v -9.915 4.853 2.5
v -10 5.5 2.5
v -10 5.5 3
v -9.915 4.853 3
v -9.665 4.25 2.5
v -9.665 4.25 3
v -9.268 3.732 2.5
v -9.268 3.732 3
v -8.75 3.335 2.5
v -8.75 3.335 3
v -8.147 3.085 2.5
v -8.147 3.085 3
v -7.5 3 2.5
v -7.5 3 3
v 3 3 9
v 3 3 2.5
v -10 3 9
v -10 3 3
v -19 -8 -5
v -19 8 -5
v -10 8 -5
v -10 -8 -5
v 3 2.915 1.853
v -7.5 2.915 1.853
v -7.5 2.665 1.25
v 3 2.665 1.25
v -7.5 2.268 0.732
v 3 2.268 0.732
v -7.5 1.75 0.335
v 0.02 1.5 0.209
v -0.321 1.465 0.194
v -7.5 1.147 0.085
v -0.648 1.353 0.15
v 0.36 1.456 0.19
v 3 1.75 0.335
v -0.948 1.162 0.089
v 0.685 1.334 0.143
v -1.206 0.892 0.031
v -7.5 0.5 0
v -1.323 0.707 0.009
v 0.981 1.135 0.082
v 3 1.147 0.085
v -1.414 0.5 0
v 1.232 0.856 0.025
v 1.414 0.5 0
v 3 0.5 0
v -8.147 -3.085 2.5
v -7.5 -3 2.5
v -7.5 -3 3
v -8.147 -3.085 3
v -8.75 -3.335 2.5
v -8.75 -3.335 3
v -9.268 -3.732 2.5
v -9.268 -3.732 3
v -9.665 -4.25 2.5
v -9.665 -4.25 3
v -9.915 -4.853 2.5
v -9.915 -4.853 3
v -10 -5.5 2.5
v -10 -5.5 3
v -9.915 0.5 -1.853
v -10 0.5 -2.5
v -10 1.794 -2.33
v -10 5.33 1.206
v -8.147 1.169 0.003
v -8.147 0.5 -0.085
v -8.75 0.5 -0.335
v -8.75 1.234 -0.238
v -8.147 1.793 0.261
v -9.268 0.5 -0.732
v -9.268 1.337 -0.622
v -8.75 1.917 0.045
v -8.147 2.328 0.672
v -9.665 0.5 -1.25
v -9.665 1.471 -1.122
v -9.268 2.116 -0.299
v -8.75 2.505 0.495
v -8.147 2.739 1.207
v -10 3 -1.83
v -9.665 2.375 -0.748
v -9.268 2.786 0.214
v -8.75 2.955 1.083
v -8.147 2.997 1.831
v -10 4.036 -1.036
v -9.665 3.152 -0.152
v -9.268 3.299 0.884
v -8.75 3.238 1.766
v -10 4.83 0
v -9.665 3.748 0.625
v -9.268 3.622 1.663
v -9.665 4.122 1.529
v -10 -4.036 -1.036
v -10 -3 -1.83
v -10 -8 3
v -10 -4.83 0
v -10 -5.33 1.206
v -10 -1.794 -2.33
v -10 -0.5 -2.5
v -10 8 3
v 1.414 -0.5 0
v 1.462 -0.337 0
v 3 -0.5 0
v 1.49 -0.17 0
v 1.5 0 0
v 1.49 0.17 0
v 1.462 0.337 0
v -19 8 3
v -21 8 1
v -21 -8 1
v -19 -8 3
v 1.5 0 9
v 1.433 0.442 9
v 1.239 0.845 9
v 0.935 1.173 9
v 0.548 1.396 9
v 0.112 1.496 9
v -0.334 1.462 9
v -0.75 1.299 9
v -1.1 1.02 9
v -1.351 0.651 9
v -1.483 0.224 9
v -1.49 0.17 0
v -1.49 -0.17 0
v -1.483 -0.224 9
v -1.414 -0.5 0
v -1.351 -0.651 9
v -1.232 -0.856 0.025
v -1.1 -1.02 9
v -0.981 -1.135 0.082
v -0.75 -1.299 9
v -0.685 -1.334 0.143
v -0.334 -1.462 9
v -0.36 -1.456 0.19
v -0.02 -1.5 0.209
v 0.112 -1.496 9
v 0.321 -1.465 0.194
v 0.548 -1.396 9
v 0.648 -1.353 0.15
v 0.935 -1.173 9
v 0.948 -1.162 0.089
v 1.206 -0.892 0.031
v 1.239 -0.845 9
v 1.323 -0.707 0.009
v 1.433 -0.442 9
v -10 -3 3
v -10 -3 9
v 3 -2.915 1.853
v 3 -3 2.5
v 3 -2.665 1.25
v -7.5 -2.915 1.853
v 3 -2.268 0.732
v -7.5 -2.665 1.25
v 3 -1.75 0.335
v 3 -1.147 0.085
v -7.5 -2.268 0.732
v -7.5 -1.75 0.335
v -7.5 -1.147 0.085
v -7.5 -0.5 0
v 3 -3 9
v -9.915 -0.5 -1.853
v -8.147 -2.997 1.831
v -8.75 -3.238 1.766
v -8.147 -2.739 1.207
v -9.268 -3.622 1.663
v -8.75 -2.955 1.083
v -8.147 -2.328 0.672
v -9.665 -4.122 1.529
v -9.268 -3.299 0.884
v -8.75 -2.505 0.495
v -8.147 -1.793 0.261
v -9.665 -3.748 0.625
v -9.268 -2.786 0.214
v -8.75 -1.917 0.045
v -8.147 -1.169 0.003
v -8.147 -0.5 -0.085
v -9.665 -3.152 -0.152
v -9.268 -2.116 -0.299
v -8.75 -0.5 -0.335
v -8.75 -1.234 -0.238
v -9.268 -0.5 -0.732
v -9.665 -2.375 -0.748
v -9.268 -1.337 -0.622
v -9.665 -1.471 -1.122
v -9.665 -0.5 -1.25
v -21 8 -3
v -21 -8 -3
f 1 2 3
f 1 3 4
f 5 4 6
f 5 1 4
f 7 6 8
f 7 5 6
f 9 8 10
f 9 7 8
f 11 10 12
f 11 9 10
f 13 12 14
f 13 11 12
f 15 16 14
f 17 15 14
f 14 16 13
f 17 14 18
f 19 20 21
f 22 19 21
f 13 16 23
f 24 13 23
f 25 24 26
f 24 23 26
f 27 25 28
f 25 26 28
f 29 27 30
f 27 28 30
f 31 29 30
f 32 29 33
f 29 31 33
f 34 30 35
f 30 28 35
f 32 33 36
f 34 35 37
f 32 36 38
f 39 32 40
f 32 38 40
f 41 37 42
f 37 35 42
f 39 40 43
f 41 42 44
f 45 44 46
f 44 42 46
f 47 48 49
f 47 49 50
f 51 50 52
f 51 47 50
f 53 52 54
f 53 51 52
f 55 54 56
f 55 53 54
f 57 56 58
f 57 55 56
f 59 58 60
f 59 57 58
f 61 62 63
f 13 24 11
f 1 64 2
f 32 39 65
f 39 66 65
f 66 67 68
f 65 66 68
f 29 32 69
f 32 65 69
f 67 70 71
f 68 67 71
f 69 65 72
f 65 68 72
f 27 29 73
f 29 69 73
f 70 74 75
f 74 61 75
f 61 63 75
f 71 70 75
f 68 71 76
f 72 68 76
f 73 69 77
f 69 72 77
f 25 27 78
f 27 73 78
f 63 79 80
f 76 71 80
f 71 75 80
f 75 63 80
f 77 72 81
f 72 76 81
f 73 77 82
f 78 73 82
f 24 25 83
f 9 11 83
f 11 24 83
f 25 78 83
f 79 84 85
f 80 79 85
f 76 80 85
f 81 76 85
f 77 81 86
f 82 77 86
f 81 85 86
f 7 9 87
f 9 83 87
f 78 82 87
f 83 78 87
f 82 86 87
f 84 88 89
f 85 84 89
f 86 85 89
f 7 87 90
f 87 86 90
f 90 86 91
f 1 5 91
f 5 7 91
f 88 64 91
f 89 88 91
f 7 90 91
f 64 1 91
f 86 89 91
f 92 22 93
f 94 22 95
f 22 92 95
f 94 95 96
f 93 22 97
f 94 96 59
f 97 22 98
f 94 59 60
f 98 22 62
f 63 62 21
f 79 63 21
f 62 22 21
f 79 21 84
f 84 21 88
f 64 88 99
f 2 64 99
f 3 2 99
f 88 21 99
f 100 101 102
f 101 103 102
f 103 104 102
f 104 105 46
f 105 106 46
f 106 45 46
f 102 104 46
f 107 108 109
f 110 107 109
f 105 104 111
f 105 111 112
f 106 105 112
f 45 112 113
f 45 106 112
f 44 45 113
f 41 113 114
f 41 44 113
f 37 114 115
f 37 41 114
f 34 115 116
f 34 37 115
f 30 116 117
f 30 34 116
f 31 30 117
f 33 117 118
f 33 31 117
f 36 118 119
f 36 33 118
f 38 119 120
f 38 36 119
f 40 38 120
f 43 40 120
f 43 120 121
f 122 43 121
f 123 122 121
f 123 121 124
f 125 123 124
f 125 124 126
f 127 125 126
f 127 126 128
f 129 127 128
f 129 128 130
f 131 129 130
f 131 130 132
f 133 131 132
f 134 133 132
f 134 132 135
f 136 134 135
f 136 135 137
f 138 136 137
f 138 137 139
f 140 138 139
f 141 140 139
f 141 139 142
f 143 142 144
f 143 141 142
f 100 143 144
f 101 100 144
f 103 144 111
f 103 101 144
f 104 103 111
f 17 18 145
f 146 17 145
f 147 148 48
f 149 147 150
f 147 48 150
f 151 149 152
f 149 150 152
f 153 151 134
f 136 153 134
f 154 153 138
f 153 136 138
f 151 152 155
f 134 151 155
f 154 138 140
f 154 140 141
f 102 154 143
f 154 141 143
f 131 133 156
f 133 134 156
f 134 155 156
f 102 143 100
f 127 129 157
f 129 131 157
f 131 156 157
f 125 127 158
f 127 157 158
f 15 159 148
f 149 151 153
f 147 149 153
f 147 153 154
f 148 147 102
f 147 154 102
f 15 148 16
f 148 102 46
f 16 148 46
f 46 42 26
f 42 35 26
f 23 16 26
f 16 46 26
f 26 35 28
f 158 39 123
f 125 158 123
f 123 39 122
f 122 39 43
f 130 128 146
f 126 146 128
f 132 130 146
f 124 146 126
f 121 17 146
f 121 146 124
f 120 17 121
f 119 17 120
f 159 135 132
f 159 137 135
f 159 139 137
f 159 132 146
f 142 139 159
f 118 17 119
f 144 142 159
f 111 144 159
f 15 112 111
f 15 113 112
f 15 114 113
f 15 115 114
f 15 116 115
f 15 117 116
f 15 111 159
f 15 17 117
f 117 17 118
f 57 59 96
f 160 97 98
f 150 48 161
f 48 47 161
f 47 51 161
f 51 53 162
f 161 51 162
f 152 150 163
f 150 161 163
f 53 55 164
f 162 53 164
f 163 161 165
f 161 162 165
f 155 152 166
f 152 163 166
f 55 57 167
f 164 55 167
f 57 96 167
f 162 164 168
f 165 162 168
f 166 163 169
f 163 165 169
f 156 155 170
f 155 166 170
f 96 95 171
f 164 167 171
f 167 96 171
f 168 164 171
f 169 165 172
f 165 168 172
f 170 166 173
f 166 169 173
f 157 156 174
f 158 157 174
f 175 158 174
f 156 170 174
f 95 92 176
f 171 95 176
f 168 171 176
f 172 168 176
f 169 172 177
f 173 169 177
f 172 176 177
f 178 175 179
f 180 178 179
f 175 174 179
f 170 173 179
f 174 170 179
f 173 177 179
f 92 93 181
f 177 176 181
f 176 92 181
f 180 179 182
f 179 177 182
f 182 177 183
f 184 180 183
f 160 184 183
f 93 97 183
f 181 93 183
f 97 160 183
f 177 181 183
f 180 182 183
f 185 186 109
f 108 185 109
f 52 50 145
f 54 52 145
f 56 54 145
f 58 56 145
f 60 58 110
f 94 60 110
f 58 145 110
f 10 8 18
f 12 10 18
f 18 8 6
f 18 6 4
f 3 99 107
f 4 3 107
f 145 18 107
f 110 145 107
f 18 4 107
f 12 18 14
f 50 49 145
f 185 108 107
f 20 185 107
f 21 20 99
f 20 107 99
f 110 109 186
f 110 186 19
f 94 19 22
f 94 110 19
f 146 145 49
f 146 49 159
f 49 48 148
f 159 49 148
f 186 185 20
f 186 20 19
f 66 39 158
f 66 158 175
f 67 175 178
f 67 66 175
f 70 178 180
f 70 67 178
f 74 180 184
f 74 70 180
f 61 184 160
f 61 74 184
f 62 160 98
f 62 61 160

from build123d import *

# Parameters (mm, degrees)
ESBO_O1_R                     = 1.5
RESSALTO_EXTRUS_O1_DEPTH      = 9
RESSALTO_EXTRUS_O2_DEPTH      = 5
RESSALTO_EXTRUS_O2_DEPTH_BACK = 11
ESBO_O2_W                     = 11
ESBO_O2_H                     = 8
FILETE1_R                     = 2.5
CHANFRO1_SIZE                 = 2


with BuildPart() as part:
    # Esboço1 → Ressalto-extrusão1 (new body)
    with BuildSketch(Plane.XY):
        Polygon((-3, -3), (3, -3), (3, 3), (-3, 3), (-10, 3), (-10, -3), align=None)
        Circle(ESBO_O1_R, mode=Mode.SUBTRACT)
    extrude(amount=RESSALTO_EXTRUS_O1_DEPTH)

    # Esboço2 → Ressalto-extrusão2 (add, two sides: drawn at the far end of the back side and taken through both)
    with BuildSketch(Plane.XZ.offset(3).offset(-RESSALTO_EXTRUS_O2_DEPTH_BACK)):
        with Locations((-15.5, -1)):
            Rectangle(ESBO_O2_W, ESBO_O2_H)
    extrude(amount=RESSALTO_EXTRUS_O2_DEPTH + RESSALTO_EXTRUS_O2_DEPTH_BACK)

    # Filete1
    # the kernel refuses this fillet: 2.5 mm, written as the material it takes off along each edge
    with BuildSketch(Plane(origin=(-10, -3, 0), x_dir=(0, 0, 1), z_dir=(1, 0, 0))) as filete1_piece_1:
        with BuildLine():
            CenterArc((FILETE1_R, -FILETE1_R), FILETE1_R, 90, 90)
            Line((0, -FILETE1_R), (0, 0))
            Line((0, 0), (FILETE1_R, 0))
        make_face()
    extrude(amount=19.25, mode=Mode.SUBTRACT)
    with BuildSketch(Plane(origin=(9.25, 3, 0), x_dir=(0, -1, 0), z_dir=(-1, 0, 0))) as filete1_piece_2:
        with BuildLine():
            CenterArc((FILETE1_R, FILETE1_R), FILETE1_R, 180, 90)
            Line((0, FILETE1_R), (0, 0))
            Line((0, 0), (FILETE1_R, 0))
        make_face()
    extrude(amount=19.25, mode=Mode.SUBTRACT)
    # the kernel refuses this fillet: 2.5 mm, written as the material it adds along each edge
    with BuildSketch(Plane(origin=(-10, -3, 2.5), x_dir=(1, 0, 0), z_dir=(0, 0, 1)), Plane(origin=(-10, 3, 2.5), x_dir=(0, 1, 0), z_dir=(0, 0, 1))) as filete1_2_piece_1:
        with BuildLine():
            CenterArc((FILETE1_R, -FILETE1_R), FILETE1_R, 90, 90)
            Line((0, -FILETE1_R), (0, 0))
            Line((0, 0), (FILETE1_R, 0))
        make_face()
    extrude(amount=0.5)
    with BuildSketch(Plane(origin=(-10, 0.5, 0), x_dir=(0, 0, -1), z_dir=(0, -1, 0))) as filete1_2_piece_2:
        with BuildLine():
            CenterArc((FILETE1_R, FILETE1_R), FILETE1_R, 180, 90)
            Line((0, FILETE1_R), (0, 0))
            Line((0, 0), (FILETE1_R, 0))
        make_face()
    extrude(amount=1)
    with BuildSketch(Plane(origin=(-10, 0.5, 2.5), x_dir=(0, 0, -1), z_dir=(0, -1, 0))) as filete1_2_piece_3:
        with BuildLine():
            CenterArc((2.5 + FILETE1_R, FILETE1_R), FILETE1_R, 180, 90)
            Line((2.5, FILETE1_R), (2.5, 0))
            Line((2.5, 0), (2.5 + FILETE1_R, 0))
        make_face()
    revolve(axis=Axis((-10, 0.5, 2.5), (1, 0, 0)), revolution_arc=90)
    with BuildSketch(Plane(origin=(-10, -0.5, 2.5), x_dir=(0, -1, 0), z_dir=(0, 0, 1))) as filete1_2_piece_4:
        with BuildLine():
            CenterArc((2.5 + FILETE1_R, FILETE1_R), FILETE1_R, 180, 90)
            Line((2.5, FILETE1_R), (2.5, 0))
            Line((2.5, 0), (2.5 + FILETE1_R, 0))
        make_face()
    revolve(axis=Axis((-10, -0.5, 2.5), (1, 0, 0)), revolution_arc=90)

    # Chanfro1
    chanfro1_edges = [part.edges().sort_by_distance(p)[0] for p in [
        (-21, 0, -5),
        (-21, 0, 3),
    ]]
    chamfer(chanfro1_edges, length=CHANFRO1_SIZE)


solid = part.part
